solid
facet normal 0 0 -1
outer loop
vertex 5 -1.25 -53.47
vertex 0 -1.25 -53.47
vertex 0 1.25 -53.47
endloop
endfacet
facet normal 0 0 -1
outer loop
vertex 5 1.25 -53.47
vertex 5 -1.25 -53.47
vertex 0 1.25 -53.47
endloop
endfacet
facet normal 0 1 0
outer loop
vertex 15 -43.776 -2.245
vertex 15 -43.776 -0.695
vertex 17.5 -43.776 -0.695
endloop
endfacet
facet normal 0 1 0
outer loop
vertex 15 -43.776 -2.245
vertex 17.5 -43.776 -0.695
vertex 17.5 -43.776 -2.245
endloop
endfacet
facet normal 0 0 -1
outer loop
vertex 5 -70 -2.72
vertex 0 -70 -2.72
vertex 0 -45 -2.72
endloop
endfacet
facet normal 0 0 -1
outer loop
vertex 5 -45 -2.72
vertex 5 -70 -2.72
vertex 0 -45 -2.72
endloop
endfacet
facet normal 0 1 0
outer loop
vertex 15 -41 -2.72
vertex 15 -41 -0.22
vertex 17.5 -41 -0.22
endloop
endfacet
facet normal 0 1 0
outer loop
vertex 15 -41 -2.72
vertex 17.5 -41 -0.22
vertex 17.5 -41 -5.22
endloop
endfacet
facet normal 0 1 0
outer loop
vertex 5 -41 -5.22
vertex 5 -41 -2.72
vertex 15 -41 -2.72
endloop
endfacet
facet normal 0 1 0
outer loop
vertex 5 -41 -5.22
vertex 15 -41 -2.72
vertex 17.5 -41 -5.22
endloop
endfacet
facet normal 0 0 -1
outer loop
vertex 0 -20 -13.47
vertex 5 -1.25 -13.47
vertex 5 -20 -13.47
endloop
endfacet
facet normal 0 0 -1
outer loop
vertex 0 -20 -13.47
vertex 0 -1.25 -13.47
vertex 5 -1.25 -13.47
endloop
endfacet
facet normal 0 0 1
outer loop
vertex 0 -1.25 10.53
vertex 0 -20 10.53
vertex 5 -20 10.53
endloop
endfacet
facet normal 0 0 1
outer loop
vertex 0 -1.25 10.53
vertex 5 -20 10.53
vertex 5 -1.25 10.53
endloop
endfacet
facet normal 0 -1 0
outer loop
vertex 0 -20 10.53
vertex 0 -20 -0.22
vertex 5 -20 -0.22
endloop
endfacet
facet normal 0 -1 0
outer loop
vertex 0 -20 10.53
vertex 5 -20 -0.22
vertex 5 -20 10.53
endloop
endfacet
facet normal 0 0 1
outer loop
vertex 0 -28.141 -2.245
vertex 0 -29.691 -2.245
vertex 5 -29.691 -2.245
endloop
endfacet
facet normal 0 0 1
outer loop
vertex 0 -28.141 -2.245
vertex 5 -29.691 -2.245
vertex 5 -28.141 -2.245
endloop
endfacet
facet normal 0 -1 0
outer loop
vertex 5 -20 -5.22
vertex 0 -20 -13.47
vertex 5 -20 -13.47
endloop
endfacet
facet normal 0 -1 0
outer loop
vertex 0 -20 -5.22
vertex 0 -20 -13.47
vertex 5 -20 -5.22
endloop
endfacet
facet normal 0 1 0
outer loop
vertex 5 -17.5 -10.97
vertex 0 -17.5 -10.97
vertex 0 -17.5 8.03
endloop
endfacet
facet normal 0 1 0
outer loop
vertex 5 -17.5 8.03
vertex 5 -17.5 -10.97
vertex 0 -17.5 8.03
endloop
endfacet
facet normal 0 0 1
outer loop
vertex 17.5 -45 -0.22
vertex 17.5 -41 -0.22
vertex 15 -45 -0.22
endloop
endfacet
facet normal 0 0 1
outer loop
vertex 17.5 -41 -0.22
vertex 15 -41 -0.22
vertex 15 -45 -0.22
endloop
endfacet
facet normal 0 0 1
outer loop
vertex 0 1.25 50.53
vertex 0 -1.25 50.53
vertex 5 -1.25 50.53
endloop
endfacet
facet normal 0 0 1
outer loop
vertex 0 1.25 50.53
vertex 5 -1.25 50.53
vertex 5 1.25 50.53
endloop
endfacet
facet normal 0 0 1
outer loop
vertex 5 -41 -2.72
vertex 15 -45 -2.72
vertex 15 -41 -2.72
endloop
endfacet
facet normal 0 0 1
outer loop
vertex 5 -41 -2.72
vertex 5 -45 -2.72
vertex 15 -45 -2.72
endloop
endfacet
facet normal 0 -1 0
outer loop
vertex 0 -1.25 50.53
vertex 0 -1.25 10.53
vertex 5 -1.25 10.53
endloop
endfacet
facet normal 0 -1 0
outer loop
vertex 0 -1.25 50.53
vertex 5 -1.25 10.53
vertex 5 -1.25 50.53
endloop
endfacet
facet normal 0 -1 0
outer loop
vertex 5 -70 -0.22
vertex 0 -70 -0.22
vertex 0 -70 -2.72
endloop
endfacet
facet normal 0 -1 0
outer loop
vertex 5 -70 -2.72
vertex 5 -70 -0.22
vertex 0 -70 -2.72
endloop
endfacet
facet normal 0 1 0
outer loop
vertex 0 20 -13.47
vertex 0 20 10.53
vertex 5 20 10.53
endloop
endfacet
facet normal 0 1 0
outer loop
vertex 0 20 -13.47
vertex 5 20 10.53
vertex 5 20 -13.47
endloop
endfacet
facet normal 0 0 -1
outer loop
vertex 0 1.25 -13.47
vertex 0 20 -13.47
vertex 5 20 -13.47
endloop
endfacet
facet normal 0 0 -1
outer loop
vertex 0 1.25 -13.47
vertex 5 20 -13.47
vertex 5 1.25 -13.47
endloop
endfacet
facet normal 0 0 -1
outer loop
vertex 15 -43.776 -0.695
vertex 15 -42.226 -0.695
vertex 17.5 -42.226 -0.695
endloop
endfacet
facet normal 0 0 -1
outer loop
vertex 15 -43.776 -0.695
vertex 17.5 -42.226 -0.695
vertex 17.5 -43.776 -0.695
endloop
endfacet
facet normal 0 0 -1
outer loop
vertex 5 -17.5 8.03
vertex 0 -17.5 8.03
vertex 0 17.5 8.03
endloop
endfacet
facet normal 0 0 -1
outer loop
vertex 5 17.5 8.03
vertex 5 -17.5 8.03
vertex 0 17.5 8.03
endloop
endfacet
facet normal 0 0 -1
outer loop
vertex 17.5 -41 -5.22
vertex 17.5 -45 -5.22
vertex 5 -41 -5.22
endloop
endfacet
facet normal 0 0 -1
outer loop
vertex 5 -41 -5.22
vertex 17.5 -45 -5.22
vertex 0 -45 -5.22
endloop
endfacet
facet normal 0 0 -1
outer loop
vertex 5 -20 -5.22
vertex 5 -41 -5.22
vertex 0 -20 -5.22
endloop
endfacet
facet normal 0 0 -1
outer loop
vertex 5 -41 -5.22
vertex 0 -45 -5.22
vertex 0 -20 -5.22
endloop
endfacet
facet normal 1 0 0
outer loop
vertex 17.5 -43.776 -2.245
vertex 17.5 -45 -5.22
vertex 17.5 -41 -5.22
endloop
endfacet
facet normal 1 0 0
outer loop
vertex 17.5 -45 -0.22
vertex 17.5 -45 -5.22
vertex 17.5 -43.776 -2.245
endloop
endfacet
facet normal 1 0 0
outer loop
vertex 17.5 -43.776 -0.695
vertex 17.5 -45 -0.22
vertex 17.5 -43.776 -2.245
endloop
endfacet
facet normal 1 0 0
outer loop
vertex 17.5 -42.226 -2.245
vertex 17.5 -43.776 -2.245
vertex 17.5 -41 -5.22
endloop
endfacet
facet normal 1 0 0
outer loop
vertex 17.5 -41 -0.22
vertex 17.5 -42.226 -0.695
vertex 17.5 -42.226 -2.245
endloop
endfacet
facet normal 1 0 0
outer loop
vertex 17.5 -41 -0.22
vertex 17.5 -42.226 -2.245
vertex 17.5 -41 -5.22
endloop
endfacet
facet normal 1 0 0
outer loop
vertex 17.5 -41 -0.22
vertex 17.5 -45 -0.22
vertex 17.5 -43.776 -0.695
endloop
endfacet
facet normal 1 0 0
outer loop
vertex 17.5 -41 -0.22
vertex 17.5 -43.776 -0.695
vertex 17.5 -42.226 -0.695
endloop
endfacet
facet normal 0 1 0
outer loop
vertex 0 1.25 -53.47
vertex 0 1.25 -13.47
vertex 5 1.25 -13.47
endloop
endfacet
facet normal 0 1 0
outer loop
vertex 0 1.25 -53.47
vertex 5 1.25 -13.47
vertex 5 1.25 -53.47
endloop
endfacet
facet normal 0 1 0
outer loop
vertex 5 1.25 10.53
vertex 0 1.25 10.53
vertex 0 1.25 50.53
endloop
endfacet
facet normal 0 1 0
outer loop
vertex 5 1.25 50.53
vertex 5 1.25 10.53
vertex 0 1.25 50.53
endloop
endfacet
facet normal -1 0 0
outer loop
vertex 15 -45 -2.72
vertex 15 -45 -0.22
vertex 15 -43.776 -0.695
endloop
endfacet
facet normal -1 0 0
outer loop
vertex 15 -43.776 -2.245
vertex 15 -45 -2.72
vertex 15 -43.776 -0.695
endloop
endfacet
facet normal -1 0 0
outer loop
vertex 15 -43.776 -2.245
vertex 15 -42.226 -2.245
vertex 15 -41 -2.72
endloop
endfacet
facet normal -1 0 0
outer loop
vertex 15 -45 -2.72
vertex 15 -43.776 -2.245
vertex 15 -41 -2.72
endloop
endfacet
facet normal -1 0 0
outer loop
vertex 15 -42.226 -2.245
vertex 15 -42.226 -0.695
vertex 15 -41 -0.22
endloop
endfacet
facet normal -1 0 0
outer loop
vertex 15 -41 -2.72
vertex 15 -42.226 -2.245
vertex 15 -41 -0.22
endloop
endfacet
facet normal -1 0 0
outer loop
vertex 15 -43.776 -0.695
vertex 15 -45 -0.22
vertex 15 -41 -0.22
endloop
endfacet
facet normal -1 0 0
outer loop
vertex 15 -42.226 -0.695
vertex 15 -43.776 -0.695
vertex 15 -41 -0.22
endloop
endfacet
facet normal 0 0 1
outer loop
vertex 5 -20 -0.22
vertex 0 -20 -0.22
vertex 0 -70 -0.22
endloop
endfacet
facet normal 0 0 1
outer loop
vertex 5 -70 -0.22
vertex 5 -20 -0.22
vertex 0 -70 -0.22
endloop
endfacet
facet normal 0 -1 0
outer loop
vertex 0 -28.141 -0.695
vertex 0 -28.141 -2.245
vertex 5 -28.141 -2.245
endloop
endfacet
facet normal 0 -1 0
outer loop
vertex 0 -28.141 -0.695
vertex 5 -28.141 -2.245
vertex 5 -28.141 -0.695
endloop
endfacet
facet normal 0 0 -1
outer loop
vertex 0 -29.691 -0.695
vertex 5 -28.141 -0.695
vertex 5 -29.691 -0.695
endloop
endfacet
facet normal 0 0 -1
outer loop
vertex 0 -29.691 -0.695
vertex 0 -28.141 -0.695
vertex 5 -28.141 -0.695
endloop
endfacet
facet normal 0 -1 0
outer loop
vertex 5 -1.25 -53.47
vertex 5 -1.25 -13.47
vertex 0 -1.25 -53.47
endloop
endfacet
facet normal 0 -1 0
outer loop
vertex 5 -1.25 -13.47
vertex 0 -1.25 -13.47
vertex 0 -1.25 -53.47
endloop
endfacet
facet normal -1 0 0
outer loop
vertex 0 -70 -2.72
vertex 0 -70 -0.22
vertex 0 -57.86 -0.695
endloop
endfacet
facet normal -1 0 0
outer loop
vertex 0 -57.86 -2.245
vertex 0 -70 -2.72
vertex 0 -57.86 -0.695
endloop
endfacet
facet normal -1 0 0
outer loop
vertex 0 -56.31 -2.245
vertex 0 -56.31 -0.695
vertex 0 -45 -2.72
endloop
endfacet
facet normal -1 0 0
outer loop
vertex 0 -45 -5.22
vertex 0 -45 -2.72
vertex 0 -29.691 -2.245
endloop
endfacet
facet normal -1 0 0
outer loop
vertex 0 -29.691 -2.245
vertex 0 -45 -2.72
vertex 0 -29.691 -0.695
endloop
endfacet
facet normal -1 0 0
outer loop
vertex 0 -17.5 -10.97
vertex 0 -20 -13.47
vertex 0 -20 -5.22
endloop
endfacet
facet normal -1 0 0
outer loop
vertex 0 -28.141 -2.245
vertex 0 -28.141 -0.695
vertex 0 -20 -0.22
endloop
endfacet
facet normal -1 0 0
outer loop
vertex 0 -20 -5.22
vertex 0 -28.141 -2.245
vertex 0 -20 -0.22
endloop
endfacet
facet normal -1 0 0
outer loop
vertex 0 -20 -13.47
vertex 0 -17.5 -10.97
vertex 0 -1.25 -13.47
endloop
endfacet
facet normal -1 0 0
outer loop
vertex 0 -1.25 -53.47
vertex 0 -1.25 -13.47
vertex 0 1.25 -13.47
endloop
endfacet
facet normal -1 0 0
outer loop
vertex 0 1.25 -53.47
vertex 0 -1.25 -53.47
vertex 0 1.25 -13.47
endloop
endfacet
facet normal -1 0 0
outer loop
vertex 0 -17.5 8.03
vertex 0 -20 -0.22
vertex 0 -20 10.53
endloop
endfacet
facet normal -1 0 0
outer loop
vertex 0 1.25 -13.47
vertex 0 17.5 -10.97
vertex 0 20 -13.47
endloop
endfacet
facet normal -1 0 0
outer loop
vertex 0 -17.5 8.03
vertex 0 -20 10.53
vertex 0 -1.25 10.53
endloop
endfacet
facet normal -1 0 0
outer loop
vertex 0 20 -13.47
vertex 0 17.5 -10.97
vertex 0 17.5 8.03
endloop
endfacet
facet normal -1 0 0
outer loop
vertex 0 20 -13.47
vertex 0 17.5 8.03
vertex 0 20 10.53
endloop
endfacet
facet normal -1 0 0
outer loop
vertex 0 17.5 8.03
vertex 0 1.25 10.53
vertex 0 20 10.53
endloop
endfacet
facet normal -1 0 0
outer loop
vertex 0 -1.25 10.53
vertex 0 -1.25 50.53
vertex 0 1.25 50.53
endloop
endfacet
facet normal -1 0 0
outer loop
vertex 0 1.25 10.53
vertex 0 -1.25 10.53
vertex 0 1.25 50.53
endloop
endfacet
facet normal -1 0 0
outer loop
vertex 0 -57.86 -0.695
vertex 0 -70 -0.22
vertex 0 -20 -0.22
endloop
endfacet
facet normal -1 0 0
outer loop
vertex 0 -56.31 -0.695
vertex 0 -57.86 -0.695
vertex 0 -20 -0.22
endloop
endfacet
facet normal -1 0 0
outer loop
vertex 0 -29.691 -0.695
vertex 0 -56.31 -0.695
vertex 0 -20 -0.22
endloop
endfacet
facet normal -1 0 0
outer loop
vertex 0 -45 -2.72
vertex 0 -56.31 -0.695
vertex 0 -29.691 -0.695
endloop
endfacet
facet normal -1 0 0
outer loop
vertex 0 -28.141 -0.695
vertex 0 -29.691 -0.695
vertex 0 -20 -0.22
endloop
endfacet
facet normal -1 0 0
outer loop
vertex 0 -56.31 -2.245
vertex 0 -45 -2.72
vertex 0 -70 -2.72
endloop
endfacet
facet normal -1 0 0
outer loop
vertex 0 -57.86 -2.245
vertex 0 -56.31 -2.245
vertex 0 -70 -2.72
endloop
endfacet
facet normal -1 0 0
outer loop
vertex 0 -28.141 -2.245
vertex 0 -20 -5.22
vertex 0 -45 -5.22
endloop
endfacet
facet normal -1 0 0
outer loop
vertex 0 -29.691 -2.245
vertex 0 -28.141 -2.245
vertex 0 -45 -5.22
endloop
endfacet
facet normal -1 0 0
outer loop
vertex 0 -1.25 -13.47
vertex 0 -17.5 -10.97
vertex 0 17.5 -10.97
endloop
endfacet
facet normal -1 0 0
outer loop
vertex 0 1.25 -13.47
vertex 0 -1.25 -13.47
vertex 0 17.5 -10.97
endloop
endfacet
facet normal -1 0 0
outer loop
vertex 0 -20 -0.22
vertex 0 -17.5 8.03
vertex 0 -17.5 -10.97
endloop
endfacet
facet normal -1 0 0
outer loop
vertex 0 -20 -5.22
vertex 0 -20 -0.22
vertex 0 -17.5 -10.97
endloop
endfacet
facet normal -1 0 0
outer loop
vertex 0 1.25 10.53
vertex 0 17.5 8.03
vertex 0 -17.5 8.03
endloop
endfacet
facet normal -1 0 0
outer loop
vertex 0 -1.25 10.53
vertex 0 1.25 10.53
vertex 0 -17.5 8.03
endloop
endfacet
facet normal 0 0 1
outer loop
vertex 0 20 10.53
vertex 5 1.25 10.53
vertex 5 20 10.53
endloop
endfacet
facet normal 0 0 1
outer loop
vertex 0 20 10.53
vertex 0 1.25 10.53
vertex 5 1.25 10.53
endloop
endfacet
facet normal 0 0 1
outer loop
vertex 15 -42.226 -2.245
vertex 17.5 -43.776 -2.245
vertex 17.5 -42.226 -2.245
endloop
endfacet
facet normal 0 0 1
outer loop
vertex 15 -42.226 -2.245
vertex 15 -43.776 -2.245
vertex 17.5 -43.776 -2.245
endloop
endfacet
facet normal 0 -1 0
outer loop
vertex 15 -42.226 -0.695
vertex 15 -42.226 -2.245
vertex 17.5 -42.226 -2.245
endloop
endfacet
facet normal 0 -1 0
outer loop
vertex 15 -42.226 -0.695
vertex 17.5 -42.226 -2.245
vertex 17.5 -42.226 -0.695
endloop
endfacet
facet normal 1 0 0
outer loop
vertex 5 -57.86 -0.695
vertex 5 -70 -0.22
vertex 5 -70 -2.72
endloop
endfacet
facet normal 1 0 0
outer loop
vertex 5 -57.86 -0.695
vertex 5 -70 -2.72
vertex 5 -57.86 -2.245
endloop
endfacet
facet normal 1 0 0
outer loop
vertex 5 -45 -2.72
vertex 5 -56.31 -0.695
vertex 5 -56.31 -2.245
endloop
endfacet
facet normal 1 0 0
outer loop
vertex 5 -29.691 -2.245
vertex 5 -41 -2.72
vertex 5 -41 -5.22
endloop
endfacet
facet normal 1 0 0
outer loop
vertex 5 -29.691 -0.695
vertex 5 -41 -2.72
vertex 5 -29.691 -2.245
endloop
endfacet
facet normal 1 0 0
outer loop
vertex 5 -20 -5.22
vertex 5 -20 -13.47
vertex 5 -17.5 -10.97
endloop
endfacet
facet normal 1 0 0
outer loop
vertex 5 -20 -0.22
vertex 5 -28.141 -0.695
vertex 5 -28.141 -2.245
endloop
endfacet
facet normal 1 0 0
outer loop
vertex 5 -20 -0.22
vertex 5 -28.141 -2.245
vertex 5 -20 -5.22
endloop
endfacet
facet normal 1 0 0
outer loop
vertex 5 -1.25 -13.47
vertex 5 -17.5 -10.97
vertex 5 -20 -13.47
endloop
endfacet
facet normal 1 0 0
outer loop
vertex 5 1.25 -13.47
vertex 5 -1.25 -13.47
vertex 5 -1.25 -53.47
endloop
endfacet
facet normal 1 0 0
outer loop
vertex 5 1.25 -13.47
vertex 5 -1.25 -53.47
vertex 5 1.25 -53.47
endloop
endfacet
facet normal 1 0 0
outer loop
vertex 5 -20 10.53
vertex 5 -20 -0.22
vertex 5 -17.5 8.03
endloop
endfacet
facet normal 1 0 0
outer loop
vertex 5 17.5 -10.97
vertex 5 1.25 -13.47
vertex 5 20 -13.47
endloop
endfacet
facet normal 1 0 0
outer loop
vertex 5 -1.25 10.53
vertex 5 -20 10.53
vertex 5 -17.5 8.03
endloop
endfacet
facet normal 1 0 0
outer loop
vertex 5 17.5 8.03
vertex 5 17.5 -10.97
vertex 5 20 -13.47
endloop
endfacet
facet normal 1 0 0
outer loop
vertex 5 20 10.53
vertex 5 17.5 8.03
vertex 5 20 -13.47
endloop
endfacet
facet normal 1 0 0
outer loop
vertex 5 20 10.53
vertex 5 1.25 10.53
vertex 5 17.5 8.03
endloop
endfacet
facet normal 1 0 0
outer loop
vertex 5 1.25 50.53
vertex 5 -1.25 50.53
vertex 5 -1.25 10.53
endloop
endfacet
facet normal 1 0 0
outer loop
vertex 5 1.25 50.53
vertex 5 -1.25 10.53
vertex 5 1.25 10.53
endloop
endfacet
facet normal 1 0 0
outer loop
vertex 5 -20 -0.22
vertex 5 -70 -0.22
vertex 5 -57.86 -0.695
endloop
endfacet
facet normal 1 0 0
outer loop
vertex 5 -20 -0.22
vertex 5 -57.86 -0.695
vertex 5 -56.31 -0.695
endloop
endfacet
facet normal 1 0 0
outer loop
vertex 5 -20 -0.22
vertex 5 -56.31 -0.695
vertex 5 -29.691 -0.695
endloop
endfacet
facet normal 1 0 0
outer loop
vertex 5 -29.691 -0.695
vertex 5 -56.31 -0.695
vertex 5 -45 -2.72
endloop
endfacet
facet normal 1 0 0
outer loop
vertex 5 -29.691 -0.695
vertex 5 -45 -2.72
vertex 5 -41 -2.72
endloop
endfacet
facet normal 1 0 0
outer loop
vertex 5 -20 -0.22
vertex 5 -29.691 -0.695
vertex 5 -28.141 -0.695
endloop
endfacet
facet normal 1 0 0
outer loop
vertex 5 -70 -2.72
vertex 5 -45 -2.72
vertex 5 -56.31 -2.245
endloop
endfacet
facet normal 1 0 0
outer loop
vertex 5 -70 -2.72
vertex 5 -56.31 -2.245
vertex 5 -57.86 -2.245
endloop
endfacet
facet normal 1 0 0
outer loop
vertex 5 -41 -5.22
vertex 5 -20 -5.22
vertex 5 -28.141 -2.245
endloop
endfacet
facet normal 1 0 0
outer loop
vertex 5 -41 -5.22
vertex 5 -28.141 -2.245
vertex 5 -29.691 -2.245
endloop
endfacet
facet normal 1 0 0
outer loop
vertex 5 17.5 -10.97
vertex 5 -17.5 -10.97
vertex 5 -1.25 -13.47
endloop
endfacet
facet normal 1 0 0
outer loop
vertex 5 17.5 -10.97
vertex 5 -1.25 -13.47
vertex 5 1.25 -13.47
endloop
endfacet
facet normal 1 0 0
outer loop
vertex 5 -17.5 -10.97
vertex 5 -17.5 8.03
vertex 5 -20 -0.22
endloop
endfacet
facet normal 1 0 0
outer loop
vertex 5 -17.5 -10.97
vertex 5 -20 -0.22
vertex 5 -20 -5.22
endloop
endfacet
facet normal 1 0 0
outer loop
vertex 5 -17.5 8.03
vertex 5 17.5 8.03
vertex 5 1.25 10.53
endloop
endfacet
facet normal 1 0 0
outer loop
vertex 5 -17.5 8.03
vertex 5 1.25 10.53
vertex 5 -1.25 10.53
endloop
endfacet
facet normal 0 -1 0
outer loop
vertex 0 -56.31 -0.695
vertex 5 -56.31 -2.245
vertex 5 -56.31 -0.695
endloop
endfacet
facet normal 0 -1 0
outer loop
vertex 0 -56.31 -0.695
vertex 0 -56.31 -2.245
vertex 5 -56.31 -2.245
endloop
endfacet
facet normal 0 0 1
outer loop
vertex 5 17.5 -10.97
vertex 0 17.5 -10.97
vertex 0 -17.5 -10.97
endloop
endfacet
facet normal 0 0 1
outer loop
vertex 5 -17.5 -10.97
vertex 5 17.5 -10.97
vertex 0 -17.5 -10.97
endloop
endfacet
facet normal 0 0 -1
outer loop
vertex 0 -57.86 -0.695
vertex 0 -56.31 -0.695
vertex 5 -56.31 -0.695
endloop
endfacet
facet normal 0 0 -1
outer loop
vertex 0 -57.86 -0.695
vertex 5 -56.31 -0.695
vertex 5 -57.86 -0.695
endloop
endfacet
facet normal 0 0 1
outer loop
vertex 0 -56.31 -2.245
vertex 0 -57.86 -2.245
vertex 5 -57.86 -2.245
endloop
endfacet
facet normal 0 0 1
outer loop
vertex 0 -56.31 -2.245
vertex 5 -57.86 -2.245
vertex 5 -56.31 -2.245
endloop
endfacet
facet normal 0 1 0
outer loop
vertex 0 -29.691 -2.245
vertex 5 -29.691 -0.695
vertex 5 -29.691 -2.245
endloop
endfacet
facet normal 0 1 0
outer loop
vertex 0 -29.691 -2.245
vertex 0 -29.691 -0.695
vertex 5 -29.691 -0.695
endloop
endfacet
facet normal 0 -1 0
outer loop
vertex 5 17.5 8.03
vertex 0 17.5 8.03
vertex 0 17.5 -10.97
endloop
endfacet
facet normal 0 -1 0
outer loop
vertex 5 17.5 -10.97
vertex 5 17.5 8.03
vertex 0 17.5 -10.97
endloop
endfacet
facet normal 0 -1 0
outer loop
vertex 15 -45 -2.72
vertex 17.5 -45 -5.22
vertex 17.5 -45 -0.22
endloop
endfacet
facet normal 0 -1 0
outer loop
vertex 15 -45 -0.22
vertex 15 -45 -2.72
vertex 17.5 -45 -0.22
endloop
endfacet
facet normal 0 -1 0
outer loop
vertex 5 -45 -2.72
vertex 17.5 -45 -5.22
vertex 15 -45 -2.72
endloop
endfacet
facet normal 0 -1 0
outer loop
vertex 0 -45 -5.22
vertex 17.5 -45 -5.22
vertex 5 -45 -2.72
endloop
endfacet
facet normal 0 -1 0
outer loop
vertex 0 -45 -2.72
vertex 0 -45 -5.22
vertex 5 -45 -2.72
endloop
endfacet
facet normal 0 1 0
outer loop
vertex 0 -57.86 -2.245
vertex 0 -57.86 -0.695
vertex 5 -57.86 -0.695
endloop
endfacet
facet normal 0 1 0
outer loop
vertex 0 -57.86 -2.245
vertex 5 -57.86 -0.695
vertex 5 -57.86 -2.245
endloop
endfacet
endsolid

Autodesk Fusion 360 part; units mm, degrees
sketch "cadru" plane through (0, 0, 0) normal (1, 0, 0) x (0, 1, 0)
  line L0 (-20, -13.4697) -> (-20, 10.5303)
  line L1 (-17.5, -10.9697) -> (-17.5, 8.0303)
  line L2 (17.5, -10.9697) -> (-17.5, -10.9697)
  line L3 (20, -13.4697) -> (-20, -13.4697)
  line L4 (17.5, 8.0303) -> (17.5, -10.9697)
  line L5 (20, 10.5303) -> (20, -13.4697)
  line L6 (-20, 10.5303) -> (20, 10.5303)
  line L7 (-17.5, 8.0303) -> (17.5, 8.0303)
  line L8 (-1.25, 10.5303) -> (-1.25, 50.5303)
  line L9 (0, 0) -> (0, 50) construction
  line L10 (1.25, 10.5303) -> (1.25, 50.5303)
  line L11 (-1.25, 50.5303) -> (1.25, 50.5303)
  line L12 (17.5, -1.4697) -> (0, -1.4697) construction
  line L13 (-1.25, -53.4697) -> (1.25, -53.4697)
  line L14 (-1.25, -13.4697) -> (-1.25, -53.4697)
  line L15 (1.25, -13.4697) -> (1.25, -53.4697)
  line L16 (-20, -0.2197) -> (-70, -0.2197)
  line L17 (-70, -0.2197) -> (-70, -2.7197)
  line L18 (-70, -2.7197) -> (-20, -2.7197)
  line L19 (0, -1.4697) -> (-28.916, -1.4697) construction
  line L20 (-28.916, -1.4697) -> (-57.085, -1.4697) construction
  line L21 (-56.31, -0.6947) -> (-57.86, -0.6947)
  line L22 (-57.86, -0.6947) -> (-57.86, -2.2447)
  line L23 (-57.86, -2.2447) -> (-56.31, -2.2447)
  line L24 (-56.31, -2.2447) -> (-56.31, -0.6947)
  line L25 (-56.31, -0.6947) -> (-57.86, -2.2447) construction
  line L26 (-57.86, -0.6947) -> (-56.31, -2.2447) construction
  line L27 (-43.0005, -1.4697) -> (-43.0005, -15) construction
  line L28 (-45.0005, -5.2197) -> (-20, -5.2197)
  line L29 (-45.0005, -5.2197) -> (-45.0005, -0.2197)
  line L30 (-41.0005, -0.2197) -> (-41.0005, -5.2197)
  line L31 (-42.2255, -0.6947) -> (-43.7755, -0.6947)
  line L32 (-43.7755, -0.6947) -> (-43.7755, -2.2447)
  line L33 (-43.7755, -2.2447) -> (-42.2255, -2.2447)
  line L34 (-42.2255, -2.2447) -> (-42.2255, -0.6947)
  line L35 (-42.2255, -0.6947) -> (-43.7755, -2.2447) construction
  line L36 (-43.7755, -0.6947) -> (-42.2255, -2.2447) construction
  line L37 (-28.141, -0.6947) -> (-29.691, -0.6947)
  line L38 (-29.691, -0.6947) -> (-29.691, -2.2447)
  line L39 (-29.691, -2.2447) -> (-28.141, -2.2447)
  line L40 (-28.141, -2.2447) -> (-28.141, -0.6947)
  line L41 (-28.141, -0.6947) -> (-29.691, -2.2447) construction
  line L42 (-29.691, -0.6947) -> (-28.141, -2.2447) construction
  point P0 (-57.085, -1.4697)
  point P1 (-43.0005, -1.4697)
  point P2 (-28.916, -1.4697)
  dimension "d1" = -2.5
  dimension "d2" = 35
  dimension "d3" = 19
  dimension "d4" = 8.0303
  dimension "d5" = 17.5
  dimension "d6" = 40
  dimension "d7" = 1.25
  dimension "d10" = 50
  dimension "d11" = 2.5
  dimension "d12" = 1.25
  dimension "d13" = 28.916
  dimension "d15" = 28.169
  dimension "d16" = 1.55
  dimension "d17" = 1.55
  dimension "d22" = 14.0845
  dimension "d23" = 2.5
  dimension "d24" = 2
  dimension "d25" = 2
  dimension "d26" = 1.55
  dimension "d27" = 1.55
  dimension "d33" = 1.55
  dimension "d34" = 1.55
extrude "Extrude1" add sketch "cadru" along normal blind 5 contours L0 L3 L5 L6 | L0 L18 L28 L30 | L3 L13 L14 L15 | L0 L16 L18 L30 | L16 L18 L29 L30 | L16 L17 L18 L29 | L6 L8 L10 L11 | L31 L32 L33 L34
extrude "Extrude2" add sketch "cadru" along normal blind 15 contours L18 L28 L29 L30
extrude "Extrude3" add sketch "cadru" along normal blind 2.5 from surface at 15 contours L18 L28 L29 L30 | L16 L18 L29 L30
equation "d22 = ( 28.169 / 2 ) * 1 mm"
